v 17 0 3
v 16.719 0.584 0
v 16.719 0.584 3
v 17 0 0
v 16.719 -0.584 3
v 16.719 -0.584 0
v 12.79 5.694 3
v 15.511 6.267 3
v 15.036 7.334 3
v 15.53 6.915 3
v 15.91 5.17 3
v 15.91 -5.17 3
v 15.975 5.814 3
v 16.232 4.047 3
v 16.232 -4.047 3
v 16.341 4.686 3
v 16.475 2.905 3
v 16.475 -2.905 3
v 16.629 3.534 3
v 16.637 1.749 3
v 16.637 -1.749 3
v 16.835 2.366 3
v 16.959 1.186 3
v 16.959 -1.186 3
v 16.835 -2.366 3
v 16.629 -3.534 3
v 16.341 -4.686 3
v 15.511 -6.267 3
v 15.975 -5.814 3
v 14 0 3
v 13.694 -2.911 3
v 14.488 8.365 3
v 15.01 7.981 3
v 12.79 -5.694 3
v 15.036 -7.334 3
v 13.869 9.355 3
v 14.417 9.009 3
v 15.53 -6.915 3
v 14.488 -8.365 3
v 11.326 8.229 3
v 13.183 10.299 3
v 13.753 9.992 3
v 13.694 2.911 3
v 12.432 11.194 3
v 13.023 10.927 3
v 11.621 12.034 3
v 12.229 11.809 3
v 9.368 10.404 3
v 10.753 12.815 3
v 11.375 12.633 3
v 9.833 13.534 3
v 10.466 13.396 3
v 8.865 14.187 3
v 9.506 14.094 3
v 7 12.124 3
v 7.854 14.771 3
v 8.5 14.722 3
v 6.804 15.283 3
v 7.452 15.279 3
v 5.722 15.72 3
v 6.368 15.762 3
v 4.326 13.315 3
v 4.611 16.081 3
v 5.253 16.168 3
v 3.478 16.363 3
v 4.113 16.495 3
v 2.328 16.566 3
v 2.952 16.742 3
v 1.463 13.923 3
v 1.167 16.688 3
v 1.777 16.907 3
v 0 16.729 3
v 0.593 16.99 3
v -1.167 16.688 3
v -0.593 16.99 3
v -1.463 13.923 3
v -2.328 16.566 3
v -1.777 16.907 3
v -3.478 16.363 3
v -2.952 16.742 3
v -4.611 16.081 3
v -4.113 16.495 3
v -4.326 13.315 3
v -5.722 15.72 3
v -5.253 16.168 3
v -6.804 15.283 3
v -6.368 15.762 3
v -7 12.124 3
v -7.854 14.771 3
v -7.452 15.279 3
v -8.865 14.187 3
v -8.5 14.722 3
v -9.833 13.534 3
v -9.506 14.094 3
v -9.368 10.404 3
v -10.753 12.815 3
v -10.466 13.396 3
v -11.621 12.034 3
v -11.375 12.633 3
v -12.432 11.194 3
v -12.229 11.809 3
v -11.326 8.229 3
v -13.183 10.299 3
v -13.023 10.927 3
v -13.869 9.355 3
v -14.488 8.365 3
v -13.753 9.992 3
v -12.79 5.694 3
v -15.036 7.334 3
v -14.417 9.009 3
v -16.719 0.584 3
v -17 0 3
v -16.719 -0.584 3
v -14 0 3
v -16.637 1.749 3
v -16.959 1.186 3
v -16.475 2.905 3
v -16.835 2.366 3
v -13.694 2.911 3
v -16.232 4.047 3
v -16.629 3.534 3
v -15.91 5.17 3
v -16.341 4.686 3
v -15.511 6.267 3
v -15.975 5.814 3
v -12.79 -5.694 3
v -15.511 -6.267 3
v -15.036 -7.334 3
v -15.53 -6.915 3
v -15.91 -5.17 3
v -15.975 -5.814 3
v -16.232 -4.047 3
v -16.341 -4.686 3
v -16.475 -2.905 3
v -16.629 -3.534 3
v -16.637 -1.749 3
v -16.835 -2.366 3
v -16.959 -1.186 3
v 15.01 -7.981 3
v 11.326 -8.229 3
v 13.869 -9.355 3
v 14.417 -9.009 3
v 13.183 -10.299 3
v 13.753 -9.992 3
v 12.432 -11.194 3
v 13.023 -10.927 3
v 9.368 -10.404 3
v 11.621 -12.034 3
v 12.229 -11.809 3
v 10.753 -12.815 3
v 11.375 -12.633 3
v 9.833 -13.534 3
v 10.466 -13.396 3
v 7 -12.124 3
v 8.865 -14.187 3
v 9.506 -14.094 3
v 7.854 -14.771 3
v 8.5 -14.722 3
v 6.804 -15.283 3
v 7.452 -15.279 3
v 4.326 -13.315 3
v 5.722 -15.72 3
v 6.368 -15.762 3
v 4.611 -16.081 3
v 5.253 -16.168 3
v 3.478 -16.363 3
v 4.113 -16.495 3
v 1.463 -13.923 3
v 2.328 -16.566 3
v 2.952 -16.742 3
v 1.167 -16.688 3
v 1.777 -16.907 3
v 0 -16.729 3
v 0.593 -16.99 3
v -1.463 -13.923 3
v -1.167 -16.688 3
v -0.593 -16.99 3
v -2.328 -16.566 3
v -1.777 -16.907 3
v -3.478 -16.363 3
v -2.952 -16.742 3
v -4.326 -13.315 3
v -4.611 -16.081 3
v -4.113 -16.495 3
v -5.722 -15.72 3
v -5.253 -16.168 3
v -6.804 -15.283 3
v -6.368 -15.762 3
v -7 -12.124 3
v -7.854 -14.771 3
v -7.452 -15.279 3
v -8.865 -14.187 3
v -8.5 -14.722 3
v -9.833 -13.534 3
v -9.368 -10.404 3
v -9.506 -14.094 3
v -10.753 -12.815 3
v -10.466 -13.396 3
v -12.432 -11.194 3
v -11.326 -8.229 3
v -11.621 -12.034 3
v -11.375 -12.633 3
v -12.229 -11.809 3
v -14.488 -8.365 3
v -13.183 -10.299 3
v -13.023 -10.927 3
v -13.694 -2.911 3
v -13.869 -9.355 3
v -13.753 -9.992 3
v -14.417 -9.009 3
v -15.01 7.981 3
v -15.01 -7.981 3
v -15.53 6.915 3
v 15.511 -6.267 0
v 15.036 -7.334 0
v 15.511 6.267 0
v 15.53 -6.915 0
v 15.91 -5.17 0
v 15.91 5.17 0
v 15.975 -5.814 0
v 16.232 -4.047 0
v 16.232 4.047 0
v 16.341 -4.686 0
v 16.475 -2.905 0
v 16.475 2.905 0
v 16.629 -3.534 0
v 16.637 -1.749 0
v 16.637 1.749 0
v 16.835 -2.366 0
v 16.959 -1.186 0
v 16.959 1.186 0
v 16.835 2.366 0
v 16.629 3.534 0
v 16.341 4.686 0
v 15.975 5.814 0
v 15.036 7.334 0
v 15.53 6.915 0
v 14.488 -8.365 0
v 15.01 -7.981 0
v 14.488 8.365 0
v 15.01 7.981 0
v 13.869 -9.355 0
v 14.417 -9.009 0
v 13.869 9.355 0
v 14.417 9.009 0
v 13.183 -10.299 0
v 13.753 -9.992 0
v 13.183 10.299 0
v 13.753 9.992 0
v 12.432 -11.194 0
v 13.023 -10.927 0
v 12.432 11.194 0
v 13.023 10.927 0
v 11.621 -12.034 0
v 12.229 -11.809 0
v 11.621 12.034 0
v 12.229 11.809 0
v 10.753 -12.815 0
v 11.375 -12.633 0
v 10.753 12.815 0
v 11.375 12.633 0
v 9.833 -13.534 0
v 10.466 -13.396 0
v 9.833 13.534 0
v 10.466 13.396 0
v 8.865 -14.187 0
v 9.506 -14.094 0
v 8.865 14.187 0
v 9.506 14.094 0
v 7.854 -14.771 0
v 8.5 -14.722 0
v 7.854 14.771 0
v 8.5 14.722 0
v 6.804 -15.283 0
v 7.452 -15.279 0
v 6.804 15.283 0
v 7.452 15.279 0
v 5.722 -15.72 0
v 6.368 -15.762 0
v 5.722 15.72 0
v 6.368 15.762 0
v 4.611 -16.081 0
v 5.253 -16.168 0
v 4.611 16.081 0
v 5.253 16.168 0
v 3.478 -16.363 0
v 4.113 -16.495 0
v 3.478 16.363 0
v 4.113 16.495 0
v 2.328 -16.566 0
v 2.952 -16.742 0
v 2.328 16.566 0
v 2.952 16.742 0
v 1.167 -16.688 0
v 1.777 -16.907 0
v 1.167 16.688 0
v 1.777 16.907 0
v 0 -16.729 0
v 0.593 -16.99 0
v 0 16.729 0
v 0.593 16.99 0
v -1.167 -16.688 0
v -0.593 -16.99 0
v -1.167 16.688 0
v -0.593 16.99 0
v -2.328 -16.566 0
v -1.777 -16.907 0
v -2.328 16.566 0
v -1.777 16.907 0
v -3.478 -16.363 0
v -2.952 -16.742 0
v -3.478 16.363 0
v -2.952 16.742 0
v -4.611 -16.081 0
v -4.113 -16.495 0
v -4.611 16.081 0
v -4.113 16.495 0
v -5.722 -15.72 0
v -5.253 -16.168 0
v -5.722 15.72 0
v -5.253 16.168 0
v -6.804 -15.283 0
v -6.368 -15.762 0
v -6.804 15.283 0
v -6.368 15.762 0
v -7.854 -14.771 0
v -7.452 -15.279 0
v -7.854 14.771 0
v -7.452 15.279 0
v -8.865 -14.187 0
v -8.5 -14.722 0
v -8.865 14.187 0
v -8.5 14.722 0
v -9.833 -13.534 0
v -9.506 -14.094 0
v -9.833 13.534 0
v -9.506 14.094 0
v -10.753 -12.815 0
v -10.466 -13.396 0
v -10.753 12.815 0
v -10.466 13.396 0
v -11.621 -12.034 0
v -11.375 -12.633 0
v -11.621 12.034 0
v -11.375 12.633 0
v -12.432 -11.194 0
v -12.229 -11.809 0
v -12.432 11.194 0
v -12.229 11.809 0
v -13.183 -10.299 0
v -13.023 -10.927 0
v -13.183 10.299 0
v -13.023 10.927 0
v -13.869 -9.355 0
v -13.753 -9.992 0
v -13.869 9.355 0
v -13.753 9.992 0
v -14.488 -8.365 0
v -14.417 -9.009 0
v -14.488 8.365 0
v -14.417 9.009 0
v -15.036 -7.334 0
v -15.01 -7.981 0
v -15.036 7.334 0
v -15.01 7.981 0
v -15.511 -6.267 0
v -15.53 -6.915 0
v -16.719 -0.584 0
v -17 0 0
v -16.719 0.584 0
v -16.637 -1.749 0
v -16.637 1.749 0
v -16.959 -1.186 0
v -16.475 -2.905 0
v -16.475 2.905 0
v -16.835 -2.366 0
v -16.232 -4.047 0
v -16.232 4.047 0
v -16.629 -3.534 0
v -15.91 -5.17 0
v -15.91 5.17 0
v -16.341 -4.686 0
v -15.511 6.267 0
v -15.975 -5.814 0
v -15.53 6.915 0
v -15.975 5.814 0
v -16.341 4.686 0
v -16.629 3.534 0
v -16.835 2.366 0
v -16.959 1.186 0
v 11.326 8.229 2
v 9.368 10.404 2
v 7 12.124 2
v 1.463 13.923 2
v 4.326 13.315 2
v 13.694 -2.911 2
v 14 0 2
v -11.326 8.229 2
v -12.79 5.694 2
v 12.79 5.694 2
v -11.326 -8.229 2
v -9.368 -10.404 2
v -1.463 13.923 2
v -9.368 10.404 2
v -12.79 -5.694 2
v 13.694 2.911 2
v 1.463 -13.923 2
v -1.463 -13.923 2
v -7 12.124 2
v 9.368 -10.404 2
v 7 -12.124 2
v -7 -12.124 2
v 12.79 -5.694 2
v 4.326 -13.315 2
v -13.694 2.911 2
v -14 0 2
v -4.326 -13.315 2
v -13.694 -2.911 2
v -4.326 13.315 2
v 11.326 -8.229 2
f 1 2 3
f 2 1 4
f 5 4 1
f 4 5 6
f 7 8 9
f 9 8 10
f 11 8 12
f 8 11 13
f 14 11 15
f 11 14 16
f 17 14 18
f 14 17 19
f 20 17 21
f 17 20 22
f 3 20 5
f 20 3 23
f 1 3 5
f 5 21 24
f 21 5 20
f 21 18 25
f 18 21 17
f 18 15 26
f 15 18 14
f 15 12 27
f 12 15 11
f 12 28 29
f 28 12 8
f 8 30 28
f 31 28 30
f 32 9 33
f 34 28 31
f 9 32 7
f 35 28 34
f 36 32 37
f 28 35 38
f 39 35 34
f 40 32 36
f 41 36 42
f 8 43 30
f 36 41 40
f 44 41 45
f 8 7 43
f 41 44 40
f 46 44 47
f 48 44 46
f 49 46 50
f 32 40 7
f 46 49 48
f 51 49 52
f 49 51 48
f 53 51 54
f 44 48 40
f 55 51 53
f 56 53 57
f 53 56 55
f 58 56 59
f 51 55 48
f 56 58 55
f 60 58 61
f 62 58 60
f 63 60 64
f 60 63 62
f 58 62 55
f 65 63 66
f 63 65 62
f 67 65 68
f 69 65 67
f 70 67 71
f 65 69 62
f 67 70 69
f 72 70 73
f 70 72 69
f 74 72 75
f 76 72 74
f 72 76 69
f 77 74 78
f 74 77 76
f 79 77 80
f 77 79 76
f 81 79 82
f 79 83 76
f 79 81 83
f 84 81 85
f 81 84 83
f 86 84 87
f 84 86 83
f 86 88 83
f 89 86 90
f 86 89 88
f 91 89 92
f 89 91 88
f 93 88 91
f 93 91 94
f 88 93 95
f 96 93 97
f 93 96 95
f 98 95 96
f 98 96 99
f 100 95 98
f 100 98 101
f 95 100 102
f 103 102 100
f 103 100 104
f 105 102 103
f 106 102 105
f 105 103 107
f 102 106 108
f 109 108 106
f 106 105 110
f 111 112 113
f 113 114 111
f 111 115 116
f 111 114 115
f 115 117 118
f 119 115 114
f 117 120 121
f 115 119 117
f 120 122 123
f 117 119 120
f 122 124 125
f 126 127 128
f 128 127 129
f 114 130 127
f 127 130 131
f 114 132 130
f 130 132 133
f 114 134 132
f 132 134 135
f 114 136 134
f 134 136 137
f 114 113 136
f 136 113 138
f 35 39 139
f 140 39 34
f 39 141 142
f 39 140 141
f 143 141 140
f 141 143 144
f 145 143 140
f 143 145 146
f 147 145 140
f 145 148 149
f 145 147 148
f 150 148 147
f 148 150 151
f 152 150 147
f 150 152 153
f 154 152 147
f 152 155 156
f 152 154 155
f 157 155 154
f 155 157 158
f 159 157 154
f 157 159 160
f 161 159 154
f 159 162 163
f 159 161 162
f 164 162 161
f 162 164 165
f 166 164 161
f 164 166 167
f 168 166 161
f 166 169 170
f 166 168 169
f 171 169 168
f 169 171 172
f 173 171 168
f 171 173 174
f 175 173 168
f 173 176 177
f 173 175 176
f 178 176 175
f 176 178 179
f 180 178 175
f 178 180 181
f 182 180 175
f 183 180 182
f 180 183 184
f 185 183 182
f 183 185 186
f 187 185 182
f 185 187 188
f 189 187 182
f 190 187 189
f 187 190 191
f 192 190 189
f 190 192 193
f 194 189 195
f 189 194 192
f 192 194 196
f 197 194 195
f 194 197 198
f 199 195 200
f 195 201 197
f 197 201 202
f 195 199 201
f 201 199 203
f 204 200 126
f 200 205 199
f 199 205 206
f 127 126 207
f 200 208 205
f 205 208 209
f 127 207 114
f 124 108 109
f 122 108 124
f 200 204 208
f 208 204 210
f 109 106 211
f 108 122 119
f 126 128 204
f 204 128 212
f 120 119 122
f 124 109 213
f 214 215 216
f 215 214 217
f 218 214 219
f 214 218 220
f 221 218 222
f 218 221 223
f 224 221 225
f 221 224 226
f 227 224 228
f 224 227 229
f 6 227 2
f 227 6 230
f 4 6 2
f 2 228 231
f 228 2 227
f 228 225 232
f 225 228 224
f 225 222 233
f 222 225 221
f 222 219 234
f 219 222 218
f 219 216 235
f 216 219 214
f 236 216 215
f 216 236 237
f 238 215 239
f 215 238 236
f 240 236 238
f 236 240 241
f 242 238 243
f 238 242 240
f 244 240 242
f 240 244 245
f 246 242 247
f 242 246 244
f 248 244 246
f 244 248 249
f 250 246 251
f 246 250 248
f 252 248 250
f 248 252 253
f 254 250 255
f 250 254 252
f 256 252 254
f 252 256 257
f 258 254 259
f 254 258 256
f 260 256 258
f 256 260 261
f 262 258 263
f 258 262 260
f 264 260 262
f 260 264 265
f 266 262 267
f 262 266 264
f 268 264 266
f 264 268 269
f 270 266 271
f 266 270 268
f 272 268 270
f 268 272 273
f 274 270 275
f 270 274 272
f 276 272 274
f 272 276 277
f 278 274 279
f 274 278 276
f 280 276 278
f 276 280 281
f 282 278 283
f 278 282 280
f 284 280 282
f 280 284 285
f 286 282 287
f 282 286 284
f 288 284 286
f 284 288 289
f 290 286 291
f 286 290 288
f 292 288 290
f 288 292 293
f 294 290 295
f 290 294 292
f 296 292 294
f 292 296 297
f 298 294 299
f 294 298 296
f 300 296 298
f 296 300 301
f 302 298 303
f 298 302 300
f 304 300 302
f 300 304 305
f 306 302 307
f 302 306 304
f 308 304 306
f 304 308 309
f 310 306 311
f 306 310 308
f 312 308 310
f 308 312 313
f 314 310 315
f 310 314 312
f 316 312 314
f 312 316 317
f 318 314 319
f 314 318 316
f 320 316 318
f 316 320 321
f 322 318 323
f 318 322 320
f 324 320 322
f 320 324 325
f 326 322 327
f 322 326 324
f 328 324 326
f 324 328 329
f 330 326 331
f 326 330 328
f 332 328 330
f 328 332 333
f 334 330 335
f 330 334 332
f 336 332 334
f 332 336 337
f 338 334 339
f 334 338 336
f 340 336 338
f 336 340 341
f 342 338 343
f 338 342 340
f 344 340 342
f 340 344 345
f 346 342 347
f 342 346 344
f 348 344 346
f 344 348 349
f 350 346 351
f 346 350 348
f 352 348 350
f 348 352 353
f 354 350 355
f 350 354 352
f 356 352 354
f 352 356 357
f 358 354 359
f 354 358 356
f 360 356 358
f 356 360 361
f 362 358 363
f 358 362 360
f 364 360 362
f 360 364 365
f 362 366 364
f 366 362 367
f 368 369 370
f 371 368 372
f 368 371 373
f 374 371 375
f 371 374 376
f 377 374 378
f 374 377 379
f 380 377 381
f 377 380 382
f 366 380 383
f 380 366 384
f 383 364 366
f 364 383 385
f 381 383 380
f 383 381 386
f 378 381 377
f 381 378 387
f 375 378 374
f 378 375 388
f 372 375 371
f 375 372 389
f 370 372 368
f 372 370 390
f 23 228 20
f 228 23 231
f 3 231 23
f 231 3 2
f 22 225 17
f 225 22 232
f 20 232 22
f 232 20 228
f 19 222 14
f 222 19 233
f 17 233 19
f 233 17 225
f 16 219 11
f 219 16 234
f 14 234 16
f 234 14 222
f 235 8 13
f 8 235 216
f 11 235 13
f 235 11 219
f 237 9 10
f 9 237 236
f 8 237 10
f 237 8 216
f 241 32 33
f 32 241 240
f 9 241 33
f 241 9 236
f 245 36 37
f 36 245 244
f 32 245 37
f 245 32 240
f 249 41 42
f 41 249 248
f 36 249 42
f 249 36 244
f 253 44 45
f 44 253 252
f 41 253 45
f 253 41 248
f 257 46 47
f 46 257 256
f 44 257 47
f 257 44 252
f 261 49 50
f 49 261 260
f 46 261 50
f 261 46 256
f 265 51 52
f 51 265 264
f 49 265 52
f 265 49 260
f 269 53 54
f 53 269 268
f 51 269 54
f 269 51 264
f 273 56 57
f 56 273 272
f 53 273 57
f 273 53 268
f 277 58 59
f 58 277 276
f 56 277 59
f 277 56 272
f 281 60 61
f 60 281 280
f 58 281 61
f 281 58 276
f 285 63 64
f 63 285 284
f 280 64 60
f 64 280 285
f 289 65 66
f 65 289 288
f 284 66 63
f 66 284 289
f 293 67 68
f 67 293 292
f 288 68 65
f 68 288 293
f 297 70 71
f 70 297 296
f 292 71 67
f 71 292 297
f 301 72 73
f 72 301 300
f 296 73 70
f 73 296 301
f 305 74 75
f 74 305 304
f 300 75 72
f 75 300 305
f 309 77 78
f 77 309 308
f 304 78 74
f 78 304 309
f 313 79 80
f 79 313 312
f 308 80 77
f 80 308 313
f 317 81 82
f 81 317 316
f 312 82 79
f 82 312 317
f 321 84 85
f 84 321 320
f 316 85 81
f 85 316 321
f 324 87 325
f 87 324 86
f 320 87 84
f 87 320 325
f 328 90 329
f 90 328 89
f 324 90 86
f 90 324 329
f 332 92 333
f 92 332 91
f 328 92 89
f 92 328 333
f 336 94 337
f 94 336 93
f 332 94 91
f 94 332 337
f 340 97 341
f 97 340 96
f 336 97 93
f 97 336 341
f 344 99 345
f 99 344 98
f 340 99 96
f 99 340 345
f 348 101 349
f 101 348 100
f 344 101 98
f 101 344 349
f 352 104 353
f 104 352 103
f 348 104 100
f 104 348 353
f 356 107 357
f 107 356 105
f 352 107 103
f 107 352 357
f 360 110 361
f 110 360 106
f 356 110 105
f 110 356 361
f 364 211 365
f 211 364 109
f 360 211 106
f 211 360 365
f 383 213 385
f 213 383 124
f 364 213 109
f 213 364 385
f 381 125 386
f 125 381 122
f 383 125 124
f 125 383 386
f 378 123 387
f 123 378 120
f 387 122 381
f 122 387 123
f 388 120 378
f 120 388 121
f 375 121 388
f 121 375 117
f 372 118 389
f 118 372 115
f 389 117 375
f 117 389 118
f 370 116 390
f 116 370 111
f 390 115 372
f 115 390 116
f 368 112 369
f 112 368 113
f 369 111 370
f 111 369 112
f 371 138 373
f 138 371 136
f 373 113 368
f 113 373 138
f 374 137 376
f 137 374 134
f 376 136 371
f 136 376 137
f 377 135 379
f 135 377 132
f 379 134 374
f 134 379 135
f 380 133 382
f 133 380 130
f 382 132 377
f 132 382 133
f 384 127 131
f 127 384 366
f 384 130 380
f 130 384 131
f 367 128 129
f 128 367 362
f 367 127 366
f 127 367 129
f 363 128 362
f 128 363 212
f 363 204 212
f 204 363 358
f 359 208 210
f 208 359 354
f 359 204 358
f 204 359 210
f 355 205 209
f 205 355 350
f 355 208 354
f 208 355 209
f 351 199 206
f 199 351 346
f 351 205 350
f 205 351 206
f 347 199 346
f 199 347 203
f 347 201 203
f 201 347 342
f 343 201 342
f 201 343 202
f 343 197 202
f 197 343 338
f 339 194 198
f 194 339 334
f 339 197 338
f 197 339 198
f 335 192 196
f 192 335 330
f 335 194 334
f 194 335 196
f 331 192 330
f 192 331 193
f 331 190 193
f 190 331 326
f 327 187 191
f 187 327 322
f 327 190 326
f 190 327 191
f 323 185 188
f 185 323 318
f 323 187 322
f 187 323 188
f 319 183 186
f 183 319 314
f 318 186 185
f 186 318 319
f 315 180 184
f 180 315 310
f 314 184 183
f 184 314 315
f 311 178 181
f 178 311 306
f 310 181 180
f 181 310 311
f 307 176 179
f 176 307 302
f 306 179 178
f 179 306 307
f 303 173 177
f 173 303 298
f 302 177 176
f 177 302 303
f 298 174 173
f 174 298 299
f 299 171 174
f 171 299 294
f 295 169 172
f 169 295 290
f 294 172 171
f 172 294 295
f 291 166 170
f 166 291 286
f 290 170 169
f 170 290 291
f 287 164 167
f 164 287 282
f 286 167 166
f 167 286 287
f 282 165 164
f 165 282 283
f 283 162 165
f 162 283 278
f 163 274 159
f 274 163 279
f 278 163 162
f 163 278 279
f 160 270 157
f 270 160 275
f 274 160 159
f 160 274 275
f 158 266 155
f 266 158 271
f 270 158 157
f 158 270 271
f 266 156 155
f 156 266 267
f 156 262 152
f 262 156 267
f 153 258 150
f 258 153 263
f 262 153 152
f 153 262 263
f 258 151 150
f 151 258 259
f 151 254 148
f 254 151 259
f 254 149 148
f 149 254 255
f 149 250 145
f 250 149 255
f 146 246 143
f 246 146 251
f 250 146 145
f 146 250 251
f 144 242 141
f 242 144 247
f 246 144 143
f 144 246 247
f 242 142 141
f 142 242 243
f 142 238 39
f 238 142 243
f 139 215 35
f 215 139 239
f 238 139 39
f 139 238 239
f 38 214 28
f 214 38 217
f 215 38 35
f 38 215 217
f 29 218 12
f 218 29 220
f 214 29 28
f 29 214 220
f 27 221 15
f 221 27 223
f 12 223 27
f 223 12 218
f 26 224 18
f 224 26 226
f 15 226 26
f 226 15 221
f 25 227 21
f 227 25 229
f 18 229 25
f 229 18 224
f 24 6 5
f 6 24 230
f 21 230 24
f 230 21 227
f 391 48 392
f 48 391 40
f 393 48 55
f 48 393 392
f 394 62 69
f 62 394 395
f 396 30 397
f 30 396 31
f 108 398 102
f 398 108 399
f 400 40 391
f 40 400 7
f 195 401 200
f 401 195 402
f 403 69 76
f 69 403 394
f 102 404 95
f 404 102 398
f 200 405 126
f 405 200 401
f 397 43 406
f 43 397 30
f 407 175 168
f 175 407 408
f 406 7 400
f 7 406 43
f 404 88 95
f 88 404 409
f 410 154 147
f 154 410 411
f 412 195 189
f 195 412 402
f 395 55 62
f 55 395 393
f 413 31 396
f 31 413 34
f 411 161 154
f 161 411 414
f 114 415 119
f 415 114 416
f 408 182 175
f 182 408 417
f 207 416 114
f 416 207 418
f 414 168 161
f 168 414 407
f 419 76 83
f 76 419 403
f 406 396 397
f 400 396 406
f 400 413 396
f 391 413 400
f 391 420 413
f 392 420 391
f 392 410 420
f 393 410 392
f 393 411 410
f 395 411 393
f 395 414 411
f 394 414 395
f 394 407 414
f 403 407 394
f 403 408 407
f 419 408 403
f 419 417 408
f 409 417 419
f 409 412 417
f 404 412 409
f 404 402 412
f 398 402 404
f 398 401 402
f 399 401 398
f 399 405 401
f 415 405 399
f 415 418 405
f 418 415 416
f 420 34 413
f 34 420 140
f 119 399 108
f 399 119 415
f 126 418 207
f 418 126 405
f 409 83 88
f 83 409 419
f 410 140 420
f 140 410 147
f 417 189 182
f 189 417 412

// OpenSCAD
/*
 * Simple coin shape
 *
 * Copyright (c) 2012 Mark Hindess
 *
 * Creative Commons Attribution-NonCommercial-ShareAlike 3.0 Unported License:
 *
 *   http://creativecommons.org/licenses/by-nc-sa/3.0/
 */

module coin(height = 3, radius = 17,
            cut_radius = 14, cut_height = 1,
            bumps = 90, bump_radius = 2, double_sided = false) {
  deg = 360/bumps;
  difference() {
    union() {
      for(n=[0:bumps-1]) {
        rotate([0, 0, n*deg])
          translate([radius-bump_radius, 0, 0])
            cylinder(r = bump_radius, h = height);
      }
      cylinder(r = radius-bump_radius, h = height);
    }
    if (cut_height > 0) {
      translate([0, 0, height-cut_height])
        cylinder(r = cut_radius, h = height-cut_height);
      if (double_sided) {
        translate([0, 0, cut_height-height])
          cylinder(r = cut_radius, h = height);
      }
    }
  }
}

coin();
